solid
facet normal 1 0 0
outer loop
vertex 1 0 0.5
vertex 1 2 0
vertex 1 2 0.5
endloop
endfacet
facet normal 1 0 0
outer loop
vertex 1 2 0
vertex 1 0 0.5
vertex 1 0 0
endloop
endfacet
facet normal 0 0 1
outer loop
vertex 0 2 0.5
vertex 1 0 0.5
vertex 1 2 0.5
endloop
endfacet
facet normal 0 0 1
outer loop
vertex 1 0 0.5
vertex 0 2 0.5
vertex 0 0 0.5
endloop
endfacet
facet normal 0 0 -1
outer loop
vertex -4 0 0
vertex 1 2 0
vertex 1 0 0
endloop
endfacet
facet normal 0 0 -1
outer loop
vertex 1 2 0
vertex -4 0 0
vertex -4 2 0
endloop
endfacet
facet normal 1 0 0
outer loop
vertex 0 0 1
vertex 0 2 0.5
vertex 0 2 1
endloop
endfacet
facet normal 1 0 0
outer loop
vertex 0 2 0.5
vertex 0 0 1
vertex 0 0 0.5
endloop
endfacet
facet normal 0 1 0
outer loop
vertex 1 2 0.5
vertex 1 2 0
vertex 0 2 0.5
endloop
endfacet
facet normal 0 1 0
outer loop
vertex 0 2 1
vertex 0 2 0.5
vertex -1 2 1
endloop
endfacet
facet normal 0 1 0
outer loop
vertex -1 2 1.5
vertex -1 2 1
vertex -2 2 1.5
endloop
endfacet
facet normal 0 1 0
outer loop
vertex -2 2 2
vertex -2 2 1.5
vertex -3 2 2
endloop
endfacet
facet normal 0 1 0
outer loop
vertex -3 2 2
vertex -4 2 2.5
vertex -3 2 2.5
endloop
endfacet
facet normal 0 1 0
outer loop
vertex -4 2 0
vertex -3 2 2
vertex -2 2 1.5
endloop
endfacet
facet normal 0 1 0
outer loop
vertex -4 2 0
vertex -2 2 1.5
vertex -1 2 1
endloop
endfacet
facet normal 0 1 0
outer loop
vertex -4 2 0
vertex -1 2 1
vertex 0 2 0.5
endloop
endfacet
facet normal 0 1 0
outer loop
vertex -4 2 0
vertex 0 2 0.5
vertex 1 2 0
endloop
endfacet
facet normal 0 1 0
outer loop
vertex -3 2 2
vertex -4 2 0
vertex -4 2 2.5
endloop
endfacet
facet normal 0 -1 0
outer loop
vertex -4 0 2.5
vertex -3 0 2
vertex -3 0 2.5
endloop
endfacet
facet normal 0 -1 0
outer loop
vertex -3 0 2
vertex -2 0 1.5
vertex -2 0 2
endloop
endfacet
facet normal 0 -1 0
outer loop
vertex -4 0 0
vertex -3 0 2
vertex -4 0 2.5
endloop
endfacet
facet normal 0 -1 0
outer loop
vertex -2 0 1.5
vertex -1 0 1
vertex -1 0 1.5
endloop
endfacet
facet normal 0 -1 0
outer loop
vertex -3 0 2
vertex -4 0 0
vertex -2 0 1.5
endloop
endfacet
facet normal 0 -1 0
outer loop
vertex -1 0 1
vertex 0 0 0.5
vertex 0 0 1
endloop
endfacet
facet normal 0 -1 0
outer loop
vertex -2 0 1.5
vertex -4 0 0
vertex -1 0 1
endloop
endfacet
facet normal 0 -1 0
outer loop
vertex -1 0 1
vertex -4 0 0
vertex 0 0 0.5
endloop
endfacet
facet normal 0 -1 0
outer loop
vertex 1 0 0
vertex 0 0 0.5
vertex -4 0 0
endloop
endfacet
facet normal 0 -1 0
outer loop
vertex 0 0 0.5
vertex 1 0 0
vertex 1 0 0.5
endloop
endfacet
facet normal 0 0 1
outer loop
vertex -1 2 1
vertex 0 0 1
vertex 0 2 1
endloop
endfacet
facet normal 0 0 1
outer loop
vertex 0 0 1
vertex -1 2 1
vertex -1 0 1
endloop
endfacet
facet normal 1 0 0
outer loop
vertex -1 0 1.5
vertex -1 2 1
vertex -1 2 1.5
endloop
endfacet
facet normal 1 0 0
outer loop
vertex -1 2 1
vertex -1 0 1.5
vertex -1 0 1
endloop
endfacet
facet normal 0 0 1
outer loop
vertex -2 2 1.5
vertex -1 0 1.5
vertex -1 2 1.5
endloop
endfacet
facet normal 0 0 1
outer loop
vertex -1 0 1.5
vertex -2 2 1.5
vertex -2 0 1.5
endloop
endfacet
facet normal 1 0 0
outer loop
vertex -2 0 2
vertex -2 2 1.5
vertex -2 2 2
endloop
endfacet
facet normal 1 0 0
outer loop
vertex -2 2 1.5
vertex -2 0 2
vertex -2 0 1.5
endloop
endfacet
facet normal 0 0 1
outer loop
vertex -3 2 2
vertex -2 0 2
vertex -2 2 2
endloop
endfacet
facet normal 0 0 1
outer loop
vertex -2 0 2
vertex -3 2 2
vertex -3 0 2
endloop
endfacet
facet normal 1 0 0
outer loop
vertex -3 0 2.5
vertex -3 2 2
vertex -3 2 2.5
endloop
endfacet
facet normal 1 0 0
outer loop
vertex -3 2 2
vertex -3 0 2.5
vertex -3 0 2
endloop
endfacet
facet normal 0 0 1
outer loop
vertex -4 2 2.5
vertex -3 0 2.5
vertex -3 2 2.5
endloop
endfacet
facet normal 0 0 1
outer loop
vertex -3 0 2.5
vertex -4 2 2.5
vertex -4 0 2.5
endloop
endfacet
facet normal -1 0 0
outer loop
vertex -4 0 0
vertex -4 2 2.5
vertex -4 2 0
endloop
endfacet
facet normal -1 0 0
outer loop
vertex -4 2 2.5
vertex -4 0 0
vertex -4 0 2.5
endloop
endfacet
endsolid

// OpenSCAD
module Stairs_01(){

    color("#cdaa7d"){
    
    translate([0,-0,0])
    cube([1,2,0.5]);

    translate([-1,-0,0])
    cube([1,2,1]);

    translate([-2,-0,0])
    cube([1,2,1.5]);

    translate([-3,-0,0])
    cube([1,2,2]);

    translate([-4,-0,0])
    cube([1,2,2.5]);

    }
}

Stairs_01();

// Written by Nicolì Angelo (Gengio) 2024: 
// MIT License

//Permission is hereby granted, free of charge, to any person obtaining a copy of this software and associated documentation files (the "Software"), to deal in the Software without restriction, including without limitation the rights to use, copy, modify, merge, publish, distribute, sublicense, and/or sell copies of the Software, and to permit persons to whom the Software is furnished to do so, subject to the following conditions:

//The above copyright notice and this permission notice shall be included in all copies or substantial portions of the Software.

//THE SOFTWARE IS PROVIDED "AS IS", WITHOUT WARRANTY OF ANY KIND, EXPRESS OR IMPLIED, INCLUDING BUT NOT LIMITED TO THE WARRANTIES OF MERCHANTABILITY, FITNESS FOR A PARTICULAR PURPOSE AND NONINFRINGEMENT. IN NO EVENT SHALL THE AUTHORS OR COPYRIGHT HOLDERS BE LIABLE FOR ANY CLAIM, DAMAGES OR OTHER LIABILITY, WHETHER IN AN ACTION OF CONTRACT, TORT OR OTHERWISE, ARISING FROM, OUT OF OR IN CONNECTION WITH THE SOFTWARE OR THE USE OR OTHER DEALINGS IN THE SOFTWARE.
